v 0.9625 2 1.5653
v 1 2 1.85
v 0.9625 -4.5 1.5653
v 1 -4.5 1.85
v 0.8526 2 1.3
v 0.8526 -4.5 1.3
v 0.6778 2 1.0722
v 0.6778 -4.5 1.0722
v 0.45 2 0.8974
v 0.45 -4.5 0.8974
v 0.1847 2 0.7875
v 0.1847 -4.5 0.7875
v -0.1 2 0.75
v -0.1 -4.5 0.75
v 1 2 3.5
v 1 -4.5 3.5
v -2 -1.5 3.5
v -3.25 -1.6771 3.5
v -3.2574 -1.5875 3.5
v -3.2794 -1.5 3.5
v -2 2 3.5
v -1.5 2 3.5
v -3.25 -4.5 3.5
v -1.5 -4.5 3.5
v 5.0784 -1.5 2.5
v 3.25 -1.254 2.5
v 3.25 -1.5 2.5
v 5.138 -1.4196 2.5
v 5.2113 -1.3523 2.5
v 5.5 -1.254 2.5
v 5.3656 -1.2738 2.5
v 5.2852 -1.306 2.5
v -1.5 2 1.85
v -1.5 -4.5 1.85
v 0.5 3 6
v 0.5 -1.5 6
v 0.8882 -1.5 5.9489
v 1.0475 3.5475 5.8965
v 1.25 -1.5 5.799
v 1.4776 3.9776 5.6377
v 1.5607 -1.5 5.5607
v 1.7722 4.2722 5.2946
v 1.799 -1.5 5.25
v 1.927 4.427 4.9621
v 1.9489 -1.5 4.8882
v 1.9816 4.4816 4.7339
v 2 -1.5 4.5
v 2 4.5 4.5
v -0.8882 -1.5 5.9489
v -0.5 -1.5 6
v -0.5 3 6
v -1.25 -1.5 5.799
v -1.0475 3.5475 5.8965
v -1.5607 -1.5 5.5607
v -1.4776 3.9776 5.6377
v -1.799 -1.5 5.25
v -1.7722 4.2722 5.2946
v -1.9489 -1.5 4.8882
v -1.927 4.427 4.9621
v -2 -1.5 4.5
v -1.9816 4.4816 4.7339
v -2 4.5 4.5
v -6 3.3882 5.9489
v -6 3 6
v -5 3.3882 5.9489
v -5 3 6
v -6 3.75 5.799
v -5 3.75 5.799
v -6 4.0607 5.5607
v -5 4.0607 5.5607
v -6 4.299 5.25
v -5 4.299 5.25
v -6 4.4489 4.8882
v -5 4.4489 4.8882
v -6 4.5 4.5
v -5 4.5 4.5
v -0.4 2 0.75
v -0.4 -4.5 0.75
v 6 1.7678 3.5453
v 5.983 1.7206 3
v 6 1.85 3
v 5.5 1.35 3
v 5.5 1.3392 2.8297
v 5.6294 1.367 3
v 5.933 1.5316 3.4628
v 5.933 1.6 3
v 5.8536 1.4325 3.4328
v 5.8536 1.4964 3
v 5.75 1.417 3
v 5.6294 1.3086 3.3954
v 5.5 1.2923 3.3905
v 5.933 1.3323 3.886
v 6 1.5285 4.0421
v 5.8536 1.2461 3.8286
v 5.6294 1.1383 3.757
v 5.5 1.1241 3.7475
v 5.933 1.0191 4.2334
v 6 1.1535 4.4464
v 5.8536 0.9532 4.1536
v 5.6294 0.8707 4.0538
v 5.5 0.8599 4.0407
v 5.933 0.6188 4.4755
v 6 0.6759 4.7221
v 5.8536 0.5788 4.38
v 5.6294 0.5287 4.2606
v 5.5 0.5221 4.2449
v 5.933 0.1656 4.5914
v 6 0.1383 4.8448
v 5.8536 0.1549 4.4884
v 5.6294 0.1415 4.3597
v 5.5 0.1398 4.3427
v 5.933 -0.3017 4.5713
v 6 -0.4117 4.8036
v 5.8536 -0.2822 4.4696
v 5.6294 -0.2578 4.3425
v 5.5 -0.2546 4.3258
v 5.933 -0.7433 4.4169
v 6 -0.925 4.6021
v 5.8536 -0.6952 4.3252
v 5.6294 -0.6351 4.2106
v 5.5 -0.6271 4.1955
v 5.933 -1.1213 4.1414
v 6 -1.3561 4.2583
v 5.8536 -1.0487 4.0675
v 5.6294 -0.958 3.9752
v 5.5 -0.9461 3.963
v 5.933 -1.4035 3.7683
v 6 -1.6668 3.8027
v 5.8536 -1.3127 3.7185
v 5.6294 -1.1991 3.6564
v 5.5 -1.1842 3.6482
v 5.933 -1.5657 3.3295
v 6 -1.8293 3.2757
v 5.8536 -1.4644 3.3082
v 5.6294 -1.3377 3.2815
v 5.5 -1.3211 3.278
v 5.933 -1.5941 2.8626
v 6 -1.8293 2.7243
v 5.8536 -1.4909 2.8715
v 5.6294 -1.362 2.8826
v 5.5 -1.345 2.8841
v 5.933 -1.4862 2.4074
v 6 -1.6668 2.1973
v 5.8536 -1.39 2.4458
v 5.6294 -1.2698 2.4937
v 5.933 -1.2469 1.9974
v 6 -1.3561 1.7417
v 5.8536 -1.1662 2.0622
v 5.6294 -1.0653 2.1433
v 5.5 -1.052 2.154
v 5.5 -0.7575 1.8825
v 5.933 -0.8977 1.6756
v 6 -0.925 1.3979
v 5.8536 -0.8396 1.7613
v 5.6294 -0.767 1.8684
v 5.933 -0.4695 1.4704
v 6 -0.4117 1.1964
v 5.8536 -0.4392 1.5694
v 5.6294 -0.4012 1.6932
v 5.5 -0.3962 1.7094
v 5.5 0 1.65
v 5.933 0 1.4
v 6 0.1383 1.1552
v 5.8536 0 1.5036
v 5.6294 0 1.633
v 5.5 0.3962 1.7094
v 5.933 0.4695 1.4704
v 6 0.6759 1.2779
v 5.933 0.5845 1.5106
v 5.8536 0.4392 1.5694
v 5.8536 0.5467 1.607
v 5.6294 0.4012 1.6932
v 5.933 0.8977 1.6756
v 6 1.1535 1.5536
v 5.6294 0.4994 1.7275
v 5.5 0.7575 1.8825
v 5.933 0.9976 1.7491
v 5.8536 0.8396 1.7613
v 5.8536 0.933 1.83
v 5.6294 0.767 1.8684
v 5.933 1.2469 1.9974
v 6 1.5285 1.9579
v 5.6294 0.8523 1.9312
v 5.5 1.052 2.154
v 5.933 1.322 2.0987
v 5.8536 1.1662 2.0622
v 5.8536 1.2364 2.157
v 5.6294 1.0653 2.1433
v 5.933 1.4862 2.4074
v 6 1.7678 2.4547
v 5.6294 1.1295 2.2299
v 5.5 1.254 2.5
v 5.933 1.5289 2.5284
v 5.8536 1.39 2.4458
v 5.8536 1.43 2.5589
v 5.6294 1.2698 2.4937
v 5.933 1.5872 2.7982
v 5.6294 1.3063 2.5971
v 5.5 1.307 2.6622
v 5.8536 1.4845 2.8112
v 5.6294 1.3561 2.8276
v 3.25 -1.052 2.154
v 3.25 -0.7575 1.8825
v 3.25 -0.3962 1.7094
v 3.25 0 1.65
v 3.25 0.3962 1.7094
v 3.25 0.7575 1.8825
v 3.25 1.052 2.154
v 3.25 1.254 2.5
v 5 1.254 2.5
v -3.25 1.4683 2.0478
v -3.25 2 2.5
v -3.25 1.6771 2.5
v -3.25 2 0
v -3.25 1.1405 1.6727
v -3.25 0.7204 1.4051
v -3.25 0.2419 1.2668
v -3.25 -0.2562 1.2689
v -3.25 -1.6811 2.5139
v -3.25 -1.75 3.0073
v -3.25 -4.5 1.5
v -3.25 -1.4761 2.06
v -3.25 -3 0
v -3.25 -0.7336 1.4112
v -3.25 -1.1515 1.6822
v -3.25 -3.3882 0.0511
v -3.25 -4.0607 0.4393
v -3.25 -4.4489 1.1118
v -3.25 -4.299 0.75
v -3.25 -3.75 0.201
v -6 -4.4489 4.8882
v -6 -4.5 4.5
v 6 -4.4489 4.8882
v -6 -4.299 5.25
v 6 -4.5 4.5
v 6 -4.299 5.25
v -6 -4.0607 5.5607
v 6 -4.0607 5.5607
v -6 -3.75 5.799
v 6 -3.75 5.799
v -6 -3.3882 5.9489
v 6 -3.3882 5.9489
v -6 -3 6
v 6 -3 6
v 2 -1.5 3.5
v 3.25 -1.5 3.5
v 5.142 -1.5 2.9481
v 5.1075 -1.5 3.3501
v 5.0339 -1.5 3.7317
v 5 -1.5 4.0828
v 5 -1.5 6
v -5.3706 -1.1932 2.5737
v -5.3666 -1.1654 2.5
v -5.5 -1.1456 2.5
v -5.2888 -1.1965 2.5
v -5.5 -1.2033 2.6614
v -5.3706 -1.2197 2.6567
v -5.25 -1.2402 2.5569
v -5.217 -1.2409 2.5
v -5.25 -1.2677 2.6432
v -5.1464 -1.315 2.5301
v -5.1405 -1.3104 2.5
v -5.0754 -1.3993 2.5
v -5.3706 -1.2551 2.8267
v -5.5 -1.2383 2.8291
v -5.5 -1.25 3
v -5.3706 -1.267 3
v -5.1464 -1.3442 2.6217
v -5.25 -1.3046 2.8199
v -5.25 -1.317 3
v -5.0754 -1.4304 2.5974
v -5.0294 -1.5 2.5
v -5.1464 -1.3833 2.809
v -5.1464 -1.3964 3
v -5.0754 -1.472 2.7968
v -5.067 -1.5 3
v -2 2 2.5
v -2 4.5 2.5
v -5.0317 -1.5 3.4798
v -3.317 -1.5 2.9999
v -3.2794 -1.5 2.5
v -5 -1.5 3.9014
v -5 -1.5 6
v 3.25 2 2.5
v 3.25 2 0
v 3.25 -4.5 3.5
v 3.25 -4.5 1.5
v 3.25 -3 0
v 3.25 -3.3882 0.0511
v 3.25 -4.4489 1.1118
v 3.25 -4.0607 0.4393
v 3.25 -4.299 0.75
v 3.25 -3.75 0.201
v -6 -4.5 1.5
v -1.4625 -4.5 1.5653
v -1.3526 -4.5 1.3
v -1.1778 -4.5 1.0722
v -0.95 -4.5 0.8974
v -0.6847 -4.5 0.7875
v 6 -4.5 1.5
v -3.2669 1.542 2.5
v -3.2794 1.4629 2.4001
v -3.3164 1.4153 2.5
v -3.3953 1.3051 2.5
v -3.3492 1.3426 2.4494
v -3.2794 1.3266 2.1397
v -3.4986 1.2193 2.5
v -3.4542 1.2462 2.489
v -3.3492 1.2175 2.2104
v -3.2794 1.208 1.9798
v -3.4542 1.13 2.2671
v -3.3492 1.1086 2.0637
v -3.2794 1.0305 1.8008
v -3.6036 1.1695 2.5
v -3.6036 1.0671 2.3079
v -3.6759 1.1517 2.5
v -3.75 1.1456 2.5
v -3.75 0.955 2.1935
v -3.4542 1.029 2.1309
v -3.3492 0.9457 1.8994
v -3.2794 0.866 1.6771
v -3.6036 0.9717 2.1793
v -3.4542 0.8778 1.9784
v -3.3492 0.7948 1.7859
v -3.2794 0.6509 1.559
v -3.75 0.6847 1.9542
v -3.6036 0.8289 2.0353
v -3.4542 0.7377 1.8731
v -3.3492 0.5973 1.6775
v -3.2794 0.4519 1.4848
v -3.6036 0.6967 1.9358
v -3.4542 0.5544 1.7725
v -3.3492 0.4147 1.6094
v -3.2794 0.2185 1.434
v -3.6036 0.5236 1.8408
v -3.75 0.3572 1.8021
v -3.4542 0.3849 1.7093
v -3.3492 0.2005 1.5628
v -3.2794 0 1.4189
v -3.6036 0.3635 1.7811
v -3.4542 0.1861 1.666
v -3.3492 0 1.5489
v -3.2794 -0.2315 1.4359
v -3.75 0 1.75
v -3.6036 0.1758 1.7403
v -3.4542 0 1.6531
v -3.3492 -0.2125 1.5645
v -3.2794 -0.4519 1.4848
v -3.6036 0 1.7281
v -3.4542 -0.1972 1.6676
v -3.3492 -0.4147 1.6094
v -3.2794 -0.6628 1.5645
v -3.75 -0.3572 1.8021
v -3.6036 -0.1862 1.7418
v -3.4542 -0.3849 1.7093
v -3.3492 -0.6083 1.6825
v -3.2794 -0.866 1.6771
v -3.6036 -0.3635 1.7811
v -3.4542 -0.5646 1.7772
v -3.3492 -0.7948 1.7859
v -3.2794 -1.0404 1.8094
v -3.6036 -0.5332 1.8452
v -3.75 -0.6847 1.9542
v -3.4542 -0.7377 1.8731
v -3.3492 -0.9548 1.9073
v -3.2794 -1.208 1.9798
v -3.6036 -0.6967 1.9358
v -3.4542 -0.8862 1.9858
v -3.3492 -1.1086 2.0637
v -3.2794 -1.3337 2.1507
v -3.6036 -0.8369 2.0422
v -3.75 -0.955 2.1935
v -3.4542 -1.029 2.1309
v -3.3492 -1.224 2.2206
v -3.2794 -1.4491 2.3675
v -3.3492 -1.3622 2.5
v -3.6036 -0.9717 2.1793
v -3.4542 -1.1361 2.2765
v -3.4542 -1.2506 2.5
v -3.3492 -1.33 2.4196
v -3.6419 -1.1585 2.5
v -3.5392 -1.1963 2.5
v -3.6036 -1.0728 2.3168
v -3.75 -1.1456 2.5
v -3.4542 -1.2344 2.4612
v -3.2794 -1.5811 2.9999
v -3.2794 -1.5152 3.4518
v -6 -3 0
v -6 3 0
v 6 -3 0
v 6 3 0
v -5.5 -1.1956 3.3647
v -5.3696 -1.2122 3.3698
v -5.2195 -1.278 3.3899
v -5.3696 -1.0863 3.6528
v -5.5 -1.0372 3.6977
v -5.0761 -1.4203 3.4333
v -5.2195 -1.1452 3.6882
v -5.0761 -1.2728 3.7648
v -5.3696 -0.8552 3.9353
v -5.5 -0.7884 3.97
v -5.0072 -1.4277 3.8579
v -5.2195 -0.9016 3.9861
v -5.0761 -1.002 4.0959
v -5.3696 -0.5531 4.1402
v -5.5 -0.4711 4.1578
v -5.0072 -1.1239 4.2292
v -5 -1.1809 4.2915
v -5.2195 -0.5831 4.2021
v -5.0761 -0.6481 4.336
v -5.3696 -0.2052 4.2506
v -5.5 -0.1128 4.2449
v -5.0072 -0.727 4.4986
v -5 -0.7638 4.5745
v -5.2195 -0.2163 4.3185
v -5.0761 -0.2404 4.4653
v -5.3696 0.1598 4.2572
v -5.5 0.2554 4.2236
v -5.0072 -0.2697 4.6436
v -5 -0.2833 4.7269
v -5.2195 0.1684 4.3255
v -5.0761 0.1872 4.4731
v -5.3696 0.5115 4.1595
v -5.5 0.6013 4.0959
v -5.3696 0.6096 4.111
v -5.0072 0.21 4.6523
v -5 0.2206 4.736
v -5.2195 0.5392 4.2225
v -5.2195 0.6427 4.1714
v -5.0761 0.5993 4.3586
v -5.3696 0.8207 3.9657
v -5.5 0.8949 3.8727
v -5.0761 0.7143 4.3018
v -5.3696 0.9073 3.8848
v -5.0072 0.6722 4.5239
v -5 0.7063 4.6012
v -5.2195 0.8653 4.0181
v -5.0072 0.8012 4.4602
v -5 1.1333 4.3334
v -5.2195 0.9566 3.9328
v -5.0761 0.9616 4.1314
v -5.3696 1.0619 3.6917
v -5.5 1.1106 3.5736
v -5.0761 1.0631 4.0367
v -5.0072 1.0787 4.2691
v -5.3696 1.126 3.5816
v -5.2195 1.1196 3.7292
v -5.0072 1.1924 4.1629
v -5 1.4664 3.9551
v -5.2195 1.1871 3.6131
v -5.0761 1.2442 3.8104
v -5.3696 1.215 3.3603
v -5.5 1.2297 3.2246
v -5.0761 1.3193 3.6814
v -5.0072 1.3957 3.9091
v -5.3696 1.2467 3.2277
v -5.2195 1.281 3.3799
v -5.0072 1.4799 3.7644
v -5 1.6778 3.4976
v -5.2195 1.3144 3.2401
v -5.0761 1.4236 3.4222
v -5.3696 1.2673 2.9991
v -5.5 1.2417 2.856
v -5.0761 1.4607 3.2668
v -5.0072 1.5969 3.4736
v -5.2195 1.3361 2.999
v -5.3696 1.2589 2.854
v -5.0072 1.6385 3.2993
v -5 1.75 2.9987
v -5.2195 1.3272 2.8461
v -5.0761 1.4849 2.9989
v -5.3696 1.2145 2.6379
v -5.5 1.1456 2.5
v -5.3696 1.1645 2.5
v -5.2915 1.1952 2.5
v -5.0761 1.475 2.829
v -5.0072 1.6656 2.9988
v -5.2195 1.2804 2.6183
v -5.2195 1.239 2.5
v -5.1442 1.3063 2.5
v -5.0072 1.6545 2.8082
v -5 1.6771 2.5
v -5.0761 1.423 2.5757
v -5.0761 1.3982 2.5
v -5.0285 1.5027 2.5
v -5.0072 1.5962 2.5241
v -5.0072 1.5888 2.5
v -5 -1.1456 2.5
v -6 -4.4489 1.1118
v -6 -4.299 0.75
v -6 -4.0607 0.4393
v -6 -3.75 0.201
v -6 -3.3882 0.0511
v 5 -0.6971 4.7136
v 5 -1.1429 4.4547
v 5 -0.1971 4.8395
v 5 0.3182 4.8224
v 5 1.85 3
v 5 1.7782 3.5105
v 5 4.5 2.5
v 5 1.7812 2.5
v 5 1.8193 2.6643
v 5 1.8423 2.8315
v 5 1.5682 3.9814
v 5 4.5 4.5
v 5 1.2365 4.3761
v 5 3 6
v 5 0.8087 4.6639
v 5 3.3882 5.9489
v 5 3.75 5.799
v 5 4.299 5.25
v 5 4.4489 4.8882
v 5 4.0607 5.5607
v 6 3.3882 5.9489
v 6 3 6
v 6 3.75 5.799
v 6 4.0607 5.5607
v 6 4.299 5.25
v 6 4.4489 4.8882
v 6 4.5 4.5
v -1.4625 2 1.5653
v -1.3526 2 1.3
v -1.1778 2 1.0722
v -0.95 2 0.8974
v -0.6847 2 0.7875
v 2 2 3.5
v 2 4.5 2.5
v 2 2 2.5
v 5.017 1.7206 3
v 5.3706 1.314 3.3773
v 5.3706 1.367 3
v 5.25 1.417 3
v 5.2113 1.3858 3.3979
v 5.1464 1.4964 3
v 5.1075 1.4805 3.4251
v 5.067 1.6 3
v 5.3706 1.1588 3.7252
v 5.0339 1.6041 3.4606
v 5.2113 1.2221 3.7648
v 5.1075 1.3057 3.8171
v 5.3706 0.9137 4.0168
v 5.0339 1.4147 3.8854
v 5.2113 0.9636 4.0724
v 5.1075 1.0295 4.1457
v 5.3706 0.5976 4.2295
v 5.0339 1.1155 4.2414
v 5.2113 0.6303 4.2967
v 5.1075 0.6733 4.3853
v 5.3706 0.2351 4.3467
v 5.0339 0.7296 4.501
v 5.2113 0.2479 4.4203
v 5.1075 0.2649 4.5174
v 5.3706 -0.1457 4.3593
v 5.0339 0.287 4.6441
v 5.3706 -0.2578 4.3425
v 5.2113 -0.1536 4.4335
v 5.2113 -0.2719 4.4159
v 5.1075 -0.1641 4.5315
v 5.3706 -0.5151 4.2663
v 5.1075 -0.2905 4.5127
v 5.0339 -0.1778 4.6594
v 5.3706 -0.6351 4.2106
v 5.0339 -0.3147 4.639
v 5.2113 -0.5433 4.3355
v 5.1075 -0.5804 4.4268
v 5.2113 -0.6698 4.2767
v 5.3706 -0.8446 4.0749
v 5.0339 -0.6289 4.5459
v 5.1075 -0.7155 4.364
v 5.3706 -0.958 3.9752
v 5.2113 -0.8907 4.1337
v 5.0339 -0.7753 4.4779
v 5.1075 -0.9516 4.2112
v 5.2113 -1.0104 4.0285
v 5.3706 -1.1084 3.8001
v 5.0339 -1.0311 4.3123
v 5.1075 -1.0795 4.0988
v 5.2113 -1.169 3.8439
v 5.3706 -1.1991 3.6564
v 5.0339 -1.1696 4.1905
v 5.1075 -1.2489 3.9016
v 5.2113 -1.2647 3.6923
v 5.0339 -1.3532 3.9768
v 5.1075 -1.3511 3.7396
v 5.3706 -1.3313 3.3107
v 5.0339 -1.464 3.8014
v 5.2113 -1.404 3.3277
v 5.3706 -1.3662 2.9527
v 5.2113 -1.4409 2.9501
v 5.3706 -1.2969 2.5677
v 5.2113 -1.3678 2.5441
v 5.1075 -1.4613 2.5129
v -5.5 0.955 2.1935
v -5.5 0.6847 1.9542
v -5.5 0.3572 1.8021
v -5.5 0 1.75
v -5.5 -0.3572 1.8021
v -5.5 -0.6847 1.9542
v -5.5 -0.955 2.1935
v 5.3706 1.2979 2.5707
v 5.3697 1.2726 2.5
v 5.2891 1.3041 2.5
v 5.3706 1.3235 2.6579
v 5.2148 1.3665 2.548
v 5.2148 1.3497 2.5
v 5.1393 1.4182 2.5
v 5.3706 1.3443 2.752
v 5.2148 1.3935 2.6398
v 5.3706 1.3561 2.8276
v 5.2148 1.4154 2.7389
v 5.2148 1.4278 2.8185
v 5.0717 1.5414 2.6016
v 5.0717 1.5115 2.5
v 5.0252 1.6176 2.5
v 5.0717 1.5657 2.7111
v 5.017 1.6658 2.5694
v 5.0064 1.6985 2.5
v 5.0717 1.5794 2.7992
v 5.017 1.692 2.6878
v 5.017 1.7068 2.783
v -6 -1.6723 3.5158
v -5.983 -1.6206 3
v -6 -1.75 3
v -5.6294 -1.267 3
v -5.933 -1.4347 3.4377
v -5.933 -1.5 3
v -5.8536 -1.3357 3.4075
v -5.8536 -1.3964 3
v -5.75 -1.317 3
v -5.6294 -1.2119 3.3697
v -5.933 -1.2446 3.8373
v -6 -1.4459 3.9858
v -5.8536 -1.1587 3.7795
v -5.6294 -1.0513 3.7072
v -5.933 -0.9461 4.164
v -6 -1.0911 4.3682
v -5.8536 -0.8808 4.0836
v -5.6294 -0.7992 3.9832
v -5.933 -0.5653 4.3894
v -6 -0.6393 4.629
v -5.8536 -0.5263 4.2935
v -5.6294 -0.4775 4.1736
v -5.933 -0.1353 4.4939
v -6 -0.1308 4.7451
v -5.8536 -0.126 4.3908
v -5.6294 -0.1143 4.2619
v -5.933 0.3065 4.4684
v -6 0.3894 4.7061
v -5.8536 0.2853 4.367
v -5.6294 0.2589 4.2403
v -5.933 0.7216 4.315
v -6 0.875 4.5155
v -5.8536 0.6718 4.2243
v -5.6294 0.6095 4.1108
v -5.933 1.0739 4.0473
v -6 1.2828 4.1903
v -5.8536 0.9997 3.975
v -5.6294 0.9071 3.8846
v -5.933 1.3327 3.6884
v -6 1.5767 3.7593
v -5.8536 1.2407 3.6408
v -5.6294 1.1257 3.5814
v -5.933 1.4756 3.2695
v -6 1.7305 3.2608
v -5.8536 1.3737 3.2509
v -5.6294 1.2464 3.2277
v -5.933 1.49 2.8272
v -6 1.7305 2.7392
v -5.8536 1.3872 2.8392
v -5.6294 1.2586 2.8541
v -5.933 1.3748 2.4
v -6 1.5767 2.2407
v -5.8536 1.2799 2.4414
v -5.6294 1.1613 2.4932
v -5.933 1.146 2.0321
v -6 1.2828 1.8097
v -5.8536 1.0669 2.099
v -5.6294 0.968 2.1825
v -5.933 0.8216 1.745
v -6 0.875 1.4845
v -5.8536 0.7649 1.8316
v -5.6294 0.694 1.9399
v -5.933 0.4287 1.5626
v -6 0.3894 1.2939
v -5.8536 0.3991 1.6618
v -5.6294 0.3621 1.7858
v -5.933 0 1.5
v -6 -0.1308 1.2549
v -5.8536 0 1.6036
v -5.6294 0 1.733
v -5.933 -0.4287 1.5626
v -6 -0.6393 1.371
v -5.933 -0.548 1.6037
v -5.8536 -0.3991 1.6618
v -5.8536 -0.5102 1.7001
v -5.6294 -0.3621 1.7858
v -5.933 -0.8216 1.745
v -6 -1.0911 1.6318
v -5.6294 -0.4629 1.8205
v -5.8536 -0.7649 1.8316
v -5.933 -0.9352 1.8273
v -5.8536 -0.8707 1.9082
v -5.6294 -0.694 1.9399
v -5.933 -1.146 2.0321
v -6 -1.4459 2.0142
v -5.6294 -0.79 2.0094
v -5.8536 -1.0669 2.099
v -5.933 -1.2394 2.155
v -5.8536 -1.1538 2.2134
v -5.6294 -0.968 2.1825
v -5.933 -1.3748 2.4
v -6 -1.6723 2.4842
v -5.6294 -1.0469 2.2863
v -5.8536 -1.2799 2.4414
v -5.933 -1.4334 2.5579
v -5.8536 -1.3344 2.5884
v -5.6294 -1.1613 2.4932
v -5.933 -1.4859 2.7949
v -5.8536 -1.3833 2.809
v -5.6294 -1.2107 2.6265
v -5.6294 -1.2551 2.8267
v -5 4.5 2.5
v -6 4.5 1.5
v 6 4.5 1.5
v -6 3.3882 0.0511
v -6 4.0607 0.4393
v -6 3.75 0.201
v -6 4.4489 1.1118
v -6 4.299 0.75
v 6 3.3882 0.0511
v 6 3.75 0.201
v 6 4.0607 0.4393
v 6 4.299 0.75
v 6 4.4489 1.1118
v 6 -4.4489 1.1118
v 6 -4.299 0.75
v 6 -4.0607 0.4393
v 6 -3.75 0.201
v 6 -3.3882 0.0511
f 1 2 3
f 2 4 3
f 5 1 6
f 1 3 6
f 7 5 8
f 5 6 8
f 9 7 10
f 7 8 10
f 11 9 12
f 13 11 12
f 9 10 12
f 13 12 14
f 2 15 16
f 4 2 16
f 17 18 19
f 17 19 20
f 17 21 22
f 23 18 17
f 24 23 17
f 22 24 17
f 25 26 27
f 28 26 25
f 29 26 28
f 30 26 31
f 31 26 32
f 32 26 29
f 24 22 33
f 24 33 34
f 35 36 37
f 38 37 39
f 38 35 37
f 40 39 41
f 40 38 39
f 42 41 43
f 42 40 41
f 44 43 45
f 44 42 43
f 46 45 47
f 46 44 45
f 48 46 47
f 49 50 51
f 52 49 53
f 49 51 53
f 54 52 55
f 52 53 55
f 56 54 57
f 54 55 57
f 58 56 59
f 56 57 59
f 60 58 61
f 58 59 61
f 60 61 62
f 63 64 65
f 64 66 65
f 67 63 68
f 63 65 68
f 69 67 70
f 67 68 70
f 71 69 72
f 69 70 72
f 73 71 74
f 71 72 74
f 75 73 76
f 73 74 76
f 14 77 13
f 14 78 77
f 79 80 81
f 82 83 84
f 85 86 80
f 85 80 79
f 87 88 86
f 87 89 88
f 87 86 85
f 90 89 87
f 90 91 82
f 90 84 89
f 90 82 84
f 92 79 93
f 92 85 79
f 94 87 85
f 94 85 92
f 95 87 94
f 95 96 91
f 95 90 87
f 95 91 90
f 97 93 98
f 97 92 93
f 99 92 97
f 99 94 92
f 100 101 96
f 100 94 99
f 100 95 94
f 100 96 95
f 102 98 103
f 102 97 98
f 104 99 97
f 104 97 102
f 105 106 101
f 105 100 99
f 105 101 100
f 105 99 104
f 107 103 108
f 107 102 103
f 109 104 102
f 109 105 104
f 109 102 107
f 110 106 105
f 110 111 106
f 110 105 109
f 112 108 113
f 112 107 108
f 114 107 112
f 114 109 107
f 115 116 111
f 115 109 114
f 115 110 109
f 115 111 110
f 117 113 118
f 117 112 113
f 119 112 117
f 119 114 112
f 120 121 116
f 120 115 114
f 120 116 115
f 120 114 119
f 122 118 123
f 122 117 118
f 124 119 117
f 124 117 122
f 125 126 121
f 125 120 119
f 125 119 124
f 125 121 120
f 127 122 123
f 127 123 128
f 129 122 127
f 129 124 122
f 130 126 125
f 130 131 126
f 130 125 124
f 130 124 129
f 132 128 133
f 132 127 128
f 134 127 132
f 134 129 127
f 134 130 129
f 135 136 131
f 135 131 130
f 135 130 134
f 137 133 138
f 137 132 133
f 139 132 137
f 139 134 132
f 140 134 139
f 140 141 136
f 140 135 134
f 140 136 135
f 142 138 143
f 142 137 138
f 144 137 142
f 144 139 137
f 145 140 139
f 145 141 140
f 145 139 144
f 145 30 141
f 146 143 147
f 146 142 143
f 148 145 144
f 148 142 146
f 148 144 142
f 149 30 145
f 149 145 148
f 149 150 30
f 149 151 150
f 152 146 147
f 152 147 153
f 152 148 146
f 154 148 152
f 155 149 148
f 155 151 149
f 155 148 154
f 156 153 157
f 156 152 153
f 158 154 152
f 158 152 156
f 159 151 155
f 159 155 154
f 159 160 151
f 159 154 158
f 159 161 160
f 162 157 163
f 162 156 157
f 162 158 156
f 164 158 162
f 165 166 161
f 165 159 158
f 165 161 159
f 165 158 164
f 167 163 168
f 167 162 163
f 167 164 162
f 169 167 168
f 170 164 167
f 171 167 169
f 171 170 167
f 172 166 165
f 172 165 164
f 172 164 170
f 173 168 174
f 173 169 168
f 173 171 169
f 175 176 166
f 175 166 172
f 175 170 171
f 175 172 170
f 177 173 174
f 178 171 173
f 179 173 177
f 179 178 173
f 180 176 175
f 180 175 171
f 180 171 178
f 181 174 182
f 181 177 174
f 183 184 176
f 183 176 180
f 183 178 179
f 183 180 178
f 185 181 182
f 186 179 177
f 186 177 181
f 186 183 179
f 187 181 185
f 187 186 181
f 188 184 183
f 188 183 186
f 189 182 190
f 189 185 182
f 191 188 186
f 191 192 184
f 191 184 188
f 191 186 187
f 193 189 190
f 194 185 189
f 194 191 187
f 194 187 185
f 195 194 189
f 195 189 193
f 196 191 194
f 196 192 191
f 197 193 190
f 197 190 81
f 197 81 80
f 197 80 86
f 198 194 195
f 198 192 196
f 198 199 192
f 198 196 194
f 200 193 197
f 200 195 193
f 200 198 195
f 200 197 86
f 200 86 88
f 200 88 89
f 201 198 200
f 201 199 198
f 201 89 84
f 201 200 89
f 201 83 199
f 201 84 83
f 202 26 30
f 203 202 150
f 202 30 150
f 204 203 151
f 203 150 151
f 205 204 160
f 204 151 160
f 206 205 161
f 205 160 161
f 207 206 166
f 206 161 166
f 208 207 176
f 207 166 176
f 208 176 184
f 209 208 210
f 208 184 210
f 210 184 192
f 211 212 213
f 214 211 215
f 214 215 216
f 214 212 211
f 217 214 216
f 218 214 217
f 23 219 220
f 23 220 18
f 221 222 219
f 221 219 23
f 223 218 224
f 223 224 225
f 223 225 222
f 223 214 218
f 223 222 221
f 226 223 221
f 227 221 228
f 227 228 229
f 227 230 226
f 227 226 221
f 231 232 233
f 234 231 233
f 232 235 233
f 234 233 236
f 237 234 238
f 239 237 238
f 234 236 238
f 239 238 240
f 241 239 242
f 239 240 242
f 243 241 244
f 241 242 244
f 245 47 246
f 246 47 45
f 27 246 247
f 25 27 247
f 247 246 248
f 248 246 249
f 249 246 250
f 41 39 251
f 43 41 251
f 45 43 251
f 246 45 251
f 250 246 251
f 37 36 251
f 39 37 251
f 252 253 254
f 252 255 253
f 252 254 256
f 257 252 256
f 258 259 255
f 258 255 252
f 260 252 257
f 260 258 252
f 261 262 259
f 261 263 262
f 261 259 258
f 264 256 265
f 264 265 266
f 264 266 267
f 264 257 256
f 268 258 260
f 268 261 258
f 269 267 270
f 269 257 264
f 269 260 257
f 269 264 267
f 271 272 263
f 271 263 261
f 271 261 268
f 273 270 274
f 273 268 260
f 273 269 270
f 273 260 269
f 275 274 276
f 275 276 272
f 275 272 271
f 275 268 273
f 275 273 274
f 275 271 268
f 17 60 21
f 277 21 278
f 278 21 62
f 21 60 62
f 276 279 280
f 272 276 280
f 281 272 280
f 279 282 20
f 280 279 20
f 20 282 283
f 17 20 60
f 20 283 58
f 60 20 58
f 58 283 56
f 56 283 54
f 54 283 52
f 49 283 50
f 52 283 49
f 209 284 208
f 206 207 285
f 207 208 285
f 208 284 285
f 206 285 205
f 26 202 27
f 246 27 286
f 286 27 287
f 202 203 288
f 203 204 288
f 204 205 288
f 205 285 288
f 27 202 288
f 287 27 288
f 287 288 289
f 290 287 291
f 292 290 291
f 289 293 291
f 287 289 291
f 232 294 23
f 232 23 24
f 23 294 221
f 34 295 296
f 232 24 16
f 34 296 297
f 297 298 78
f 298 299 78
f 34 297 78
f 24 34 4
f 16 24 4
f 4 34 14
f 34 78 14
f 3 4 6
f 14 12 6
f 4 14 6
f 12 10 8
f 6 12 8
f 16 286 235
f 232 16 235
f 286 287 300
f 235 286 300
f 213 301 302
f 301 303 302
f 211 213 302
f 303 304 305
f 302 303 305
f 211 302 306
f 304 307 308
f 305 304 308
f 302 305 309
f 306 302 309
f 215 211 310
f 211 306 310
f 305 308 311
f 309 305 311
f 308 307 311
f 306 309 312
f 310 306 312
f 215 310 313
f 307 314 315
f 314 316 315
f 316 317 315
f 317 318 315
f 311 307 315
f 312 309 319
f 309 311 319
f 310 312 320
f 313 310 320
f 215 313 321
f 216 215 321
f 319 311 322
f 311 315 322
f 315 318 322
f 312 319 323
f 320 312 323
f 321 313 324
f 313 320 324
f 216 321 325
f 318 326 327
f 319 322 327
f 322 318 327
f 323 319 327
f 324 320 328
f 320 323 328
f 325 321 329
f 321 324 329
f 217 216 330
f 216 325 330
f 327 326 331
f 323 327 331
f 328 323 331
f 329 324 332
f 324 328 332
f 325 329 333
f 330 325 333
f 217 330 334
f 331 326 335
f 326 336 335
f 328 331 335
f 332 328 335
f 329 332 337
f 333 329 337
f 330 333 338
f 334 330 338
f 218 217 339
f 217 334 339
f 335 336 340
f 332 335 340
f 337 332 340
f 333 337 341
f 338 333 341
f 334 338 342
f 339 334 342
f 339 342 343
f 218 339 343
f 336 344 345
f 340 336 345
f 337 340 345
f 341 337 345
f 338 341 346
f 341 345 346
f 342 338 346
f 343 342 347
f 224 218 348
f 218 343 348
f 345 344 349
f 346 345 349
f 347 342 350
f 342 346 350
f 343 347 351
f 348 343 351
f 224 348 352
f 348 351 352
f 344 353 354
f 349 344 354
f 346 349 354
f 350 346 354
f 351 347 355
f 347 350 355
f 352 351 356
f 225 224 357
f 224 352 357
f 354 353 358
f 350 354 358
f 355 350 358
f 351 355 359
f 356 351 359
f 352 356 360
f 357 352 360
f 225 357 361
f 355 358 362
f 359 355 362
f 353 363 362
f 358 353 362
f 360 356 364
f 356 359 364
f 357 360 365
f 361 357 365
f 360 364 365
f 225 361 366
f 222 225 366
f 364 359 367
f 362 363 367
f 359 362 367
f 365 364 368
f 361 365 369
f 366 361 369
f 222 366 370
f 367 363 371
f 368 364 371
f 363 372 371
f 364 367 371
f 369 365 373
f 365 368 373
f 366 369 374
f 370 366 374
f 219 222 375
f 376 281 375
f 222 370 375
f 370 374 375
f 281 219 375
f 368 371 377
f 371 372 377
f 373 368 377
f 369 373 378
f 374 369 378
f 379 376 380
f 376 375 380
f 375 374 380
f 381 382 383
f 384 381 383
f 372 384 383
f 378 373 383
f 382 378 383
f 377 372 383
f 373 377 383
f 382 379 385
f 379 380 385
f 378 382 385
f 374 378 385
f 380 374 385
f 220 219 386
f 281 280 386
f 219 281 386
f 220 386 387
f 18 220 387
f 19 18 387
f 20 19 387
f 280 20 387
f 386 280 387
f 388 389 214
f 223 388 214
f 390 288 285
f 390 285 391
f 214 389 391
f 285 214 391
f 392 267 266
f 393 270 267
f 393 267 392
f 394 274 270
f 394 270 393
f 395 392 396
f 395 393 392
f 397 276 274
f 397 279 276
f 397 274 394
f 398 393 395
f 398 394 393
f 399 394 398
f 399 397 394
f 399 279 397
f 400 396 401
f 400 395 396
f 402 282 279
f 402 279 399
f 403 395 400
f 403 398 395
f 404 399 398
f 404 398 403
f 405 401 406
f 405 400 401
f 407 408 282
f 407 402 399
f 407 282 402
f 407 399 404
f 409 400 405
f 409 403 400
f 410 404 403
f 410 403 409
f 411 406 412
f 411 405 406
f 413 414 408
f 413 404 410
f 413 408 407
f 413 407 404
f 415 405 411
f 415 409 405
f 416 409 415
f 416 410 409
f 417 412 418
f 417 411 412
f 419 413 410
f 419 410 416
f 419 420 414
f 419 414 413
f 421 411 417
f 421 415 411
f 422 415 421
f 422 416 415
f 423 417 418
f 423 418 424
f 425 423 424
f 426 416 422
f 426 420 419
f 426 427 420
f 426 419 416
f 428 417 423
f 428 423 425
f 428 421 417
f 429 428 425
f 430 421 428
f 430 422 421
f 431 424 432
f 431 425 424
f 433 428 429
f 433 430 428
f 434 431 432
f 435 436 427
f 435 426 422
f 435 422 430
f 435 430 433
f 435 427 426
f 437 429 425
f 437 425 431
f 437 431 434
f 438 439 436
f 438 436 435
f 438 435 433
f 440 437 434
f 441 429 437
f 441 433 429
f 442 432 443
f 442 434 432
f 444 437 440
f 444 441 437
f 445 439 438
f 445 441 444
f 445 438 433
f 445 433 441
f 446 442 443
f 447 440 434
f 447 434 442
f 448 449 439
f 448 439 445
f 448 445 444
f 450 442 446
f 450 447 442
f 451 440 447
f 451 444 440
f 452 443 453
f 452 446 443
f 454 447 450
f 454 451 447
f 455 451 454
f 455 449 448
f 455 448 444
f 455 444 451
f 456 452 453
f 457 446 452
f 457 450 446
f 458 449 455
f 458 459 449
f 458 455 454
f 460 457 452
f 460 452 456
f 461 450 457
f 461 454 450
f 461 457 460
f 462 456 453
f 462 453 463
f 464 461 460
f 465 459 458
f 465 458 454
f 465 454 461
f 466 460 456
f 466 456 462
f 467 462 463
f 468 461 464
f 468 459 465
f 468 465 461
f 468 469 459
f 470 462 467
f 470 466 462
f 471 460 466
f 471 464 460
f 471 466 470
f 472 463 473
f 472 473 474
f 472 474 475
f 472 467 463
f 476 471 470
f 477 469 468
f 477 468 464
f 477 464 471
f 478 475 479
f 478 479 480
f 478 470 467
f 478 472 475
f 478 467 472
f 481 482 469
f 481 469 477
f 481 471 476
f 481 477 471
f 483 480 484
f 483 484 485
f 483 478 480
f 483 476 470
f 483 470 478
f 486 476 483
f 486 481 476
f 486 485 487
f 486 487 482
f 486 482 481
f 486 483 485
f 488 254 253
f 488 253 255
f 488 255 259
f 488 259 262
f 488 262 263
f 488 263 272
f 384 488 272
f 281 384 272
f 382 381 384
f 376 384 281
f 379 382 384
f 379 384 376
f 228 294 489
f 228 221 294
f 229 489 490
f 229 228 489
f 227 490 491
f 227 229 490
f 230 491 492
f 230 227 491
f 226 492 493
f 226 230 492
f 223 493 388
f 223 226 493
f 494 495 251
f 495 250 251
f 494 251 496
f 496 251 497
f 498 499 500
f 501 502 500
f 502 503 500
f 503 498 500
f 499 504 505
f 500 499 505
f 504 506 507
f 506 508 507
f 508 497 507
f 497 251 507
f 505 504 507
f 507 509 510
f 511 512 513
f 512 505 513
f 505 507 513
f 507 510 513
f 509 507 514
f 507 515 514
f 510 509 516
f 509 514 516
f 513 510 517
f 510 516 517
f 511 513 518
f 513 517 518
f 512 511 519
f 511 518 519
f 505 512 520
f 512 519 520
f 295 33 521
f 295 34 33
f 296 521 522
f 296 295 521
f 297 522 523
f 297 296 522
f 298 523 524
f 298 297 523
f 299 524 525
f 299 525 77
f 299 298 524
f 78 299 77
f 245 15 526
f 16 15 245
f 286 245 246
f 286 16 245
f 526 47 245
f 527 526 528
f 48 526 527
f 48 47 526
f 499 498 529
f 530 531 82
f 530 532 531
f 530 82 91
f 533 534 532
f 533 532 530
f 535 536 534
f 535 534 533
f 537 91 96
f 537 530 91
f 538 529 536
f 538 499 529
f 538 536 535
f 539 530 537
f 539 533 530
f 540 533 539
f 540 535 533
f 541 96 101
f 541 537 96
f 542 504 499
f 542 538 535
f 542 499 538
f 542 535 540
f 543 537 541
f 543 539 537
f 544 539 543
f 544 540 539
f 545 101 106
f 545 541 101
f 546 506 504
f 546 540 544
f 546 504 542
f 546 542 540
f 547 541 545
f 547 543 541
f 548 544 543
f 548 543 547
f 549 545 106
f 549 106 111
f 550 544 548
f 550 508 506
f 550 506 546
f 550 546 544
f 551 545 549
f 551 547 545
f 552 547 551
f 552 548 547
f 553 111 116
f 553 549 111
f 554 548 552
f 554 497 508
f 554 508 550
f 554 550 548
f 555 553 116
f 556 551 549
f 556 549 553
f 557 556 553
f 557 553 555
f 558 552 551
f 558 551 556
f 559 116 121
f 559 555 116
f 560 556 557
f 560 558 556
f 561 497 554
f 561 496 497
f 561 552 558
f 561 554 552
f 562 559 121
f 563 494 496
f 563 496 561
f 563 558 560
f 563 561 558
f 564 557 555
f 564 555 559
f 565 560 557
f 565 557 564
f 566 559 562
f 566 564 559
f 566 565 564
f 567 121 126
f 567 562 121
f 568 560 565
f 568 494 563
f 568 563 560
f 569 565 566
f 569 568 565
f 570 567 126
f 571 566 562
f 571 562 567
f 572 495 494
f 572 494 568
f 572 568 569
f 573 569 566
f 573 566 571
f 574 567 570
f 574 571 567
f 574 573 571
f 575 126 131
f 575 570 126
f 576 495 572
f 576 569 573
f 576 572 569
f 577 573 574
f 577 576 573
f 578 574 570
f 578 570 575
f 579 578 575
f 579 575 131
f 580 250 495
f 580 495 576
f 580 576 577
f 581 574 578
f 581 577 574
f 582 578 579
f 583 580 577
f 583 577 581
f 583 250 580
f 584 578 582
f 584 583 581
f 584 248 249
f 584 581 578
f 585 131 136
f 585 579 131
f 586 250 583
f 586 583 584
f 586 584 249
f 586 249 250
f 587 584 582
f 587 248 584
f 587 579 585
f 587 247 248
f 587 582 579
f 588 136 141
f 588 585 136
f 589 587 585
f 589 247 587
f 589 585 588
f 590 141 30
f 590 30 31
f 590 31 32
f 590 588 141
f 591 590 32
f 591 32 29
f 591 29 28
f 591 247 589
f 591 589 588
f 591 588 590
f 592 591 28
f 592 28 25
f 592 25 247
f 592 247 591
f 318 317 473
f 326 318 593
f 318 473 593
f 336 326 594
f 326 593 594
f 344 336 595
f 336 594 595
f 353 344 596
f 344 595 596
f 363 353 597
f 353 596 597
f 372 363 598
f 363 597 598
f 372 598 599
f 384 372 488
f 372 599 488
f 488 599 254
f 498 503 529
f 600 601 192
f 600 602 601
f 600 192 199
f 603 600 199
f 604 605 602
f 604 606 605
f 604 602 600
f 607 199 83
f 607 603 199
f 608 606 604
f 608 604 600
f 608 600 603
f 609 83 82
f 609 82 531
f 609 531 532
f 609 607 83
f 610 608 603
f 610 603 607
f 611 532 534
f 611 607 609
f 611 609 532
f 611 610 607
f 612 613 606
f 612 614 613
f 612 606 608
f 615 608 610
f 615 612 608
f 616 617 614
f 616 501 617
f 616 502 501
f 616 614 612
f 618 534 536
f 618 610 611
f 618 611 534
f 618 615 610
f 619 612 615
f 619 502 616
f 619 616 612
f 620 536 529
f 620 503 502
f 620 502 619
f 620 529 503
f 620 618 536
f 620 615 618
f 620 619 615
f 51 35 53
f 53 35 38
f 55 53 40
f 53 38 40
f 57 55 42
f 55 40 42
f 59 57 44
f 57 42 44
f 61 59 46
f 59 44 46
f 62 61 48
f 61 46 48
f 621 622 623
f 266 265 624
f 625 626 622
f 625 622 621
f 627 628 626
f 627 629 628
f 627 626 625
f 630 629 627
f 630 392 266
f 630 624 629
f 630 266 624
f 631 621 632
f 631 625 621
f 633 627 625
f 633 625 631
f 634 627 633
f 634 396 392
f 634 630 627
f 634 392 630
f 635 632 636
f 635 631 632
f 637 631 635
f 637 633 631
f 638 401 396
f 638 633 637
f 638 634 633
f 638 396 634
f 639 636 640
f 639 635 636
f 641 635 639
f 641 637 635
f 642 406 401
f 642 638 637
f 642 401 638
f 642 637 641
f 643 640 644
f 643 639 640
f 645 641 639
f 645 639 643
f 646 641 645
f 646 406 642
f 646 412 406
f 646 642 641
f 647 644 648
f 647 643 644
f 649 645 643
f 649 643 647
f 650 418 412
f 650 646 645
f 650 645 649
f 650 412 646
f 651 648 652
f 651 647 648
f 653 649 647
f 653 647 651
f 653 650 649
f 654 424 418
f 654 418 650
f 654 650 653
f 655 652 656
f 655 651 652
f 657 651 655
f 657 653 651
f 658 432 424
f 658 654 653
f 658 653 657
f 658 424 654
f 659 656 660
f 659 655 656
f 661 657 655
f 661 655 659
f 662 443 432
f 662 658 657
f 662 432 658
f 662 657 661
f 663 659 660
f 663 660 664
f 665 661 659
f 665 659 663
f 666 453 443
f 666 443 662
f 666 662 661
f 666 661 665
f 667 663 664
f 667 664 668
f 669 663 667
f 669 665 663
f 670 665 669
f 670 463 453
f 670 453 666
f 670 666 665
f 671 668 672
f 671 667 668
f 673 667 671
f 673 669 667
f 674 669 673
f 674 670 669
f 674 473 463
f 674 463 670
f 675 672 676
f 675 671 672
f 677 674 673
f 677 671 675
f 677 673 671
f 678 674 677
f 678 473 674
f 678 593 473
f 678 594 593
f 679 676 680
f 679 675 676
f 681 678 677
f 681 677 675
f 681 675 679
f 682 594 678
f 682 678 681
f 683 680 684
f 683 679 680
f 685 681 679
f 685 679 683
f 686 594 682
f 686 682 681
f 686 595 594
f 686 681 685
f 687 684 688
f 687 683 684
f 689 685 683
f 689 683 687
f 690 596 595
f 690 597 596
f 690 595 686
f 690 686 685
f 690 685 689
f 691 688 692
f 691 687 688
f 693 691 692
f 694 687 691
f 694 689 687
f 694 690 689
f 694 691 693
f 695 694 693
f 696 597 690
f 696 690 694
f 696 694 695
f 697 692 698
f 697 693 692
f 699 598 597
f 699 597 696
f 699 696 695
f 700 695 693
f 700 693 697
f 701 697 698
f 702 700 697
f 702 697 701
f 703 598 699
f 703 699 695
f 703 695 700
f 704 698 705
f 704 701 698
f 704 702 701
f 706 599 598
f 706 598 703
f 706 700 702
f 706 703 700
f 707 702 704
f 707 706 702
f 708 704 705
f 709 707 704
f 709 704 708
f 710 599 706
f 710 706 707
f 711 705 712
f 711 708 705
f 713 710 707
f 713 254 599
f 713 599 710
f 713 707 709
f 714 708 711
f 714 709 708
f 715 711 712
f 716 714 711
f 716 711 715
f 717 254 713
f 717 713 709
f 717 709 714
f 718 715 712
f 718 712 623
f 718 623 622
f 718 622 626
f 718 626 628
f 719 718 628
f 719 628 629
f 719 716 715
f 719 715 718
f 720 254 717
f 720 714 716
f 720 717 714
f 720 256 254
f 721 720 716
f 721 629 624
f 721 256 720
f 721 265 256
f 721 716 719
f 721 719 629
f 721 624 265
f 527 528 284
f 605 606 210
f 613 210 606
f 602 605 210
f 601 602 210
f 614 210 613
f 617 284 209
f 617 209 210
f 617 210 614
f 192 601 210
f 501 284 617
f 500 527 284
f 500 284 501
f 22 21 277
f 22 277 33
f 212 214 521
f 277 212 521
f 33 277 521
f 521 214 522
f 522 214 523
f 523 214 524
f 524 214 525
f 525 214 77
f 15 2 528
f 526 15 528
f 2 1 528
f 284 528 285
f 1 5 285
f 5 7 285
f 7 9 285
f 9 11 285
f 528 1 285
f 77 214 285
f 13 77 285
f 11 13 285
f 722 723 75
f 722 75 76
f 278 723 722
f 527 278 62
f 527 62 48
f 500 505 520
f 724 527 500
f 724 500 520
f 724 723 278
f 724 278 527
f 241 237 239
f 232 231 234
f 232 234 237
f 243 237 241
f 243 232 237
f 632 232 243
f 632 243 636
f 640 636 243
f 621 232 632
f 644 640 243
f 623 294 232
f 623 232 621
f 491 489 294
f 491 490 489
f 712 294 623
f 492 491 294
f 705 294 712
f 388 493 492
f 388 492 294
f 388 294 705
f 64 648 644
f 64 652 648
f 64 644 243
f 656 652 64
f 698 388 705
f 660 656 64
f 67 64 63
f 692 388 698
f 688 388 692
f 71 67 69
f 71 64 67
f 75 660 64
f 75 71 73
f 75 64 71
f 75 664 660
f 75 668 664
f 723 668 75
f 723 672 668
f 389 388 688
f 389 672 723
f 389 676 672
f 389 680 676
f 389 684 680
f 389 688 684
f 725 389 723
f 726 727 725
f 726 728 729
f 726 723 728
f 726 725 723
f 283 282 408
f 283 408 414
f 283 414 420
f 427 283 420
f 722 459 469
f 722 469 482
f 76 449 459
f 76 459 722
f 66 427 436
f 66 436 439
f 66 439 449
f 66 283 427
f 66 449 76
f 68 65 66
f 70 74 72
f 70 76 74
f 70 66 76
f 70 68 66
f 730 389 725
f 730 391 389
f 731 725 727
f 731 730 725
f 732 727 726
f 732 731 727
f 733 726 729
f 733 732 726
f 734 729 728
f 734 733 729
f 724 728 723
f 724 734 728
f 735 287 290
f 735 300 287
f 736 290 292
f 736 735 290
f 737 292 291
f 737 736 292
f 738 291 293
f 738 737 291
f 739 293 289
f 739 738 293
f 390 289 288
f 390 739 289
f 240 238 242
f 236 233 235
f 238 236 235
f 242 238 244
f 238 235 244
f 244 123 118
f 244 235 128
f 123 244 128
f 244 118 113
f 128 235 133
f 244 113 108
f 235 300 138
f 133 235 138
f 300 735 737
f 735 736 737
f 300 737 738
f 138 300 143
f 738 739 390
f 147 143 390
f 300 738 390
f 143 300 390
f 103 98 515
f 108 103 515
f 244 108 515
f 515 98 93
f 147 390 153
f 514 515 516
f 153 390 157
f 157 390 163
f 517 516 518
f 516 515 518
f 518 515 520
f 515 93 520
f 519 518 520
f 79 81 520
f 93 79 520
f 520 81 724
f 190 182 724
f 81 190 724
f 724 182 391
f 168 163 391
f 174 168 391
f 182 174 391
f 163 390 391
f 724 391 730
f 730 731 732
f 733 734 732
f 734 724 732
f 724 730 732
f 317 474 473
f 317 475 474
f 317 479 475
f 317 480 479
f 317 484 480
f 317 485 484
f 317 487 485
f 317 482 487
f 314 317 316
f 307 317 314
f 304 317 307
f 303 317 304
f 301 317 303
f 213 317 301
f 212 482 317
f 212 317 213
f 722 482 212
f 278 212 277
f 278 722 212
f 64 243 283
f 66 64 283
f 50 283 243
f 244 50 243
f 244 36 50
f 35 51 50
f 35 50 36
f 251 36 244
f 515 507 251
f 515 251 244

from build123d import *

# Parameters (mm, degrees)
F0_W          = 12
F0_H          = 9
F1_DEPTH      = 6
F2_W          = 3
F2_H          = 6
F3_DEPTH      = 3.5
F4_W          = 6.5
F4_H          = 6.5
F5_DEPTH      = 3.5
F6_R          = 1.35
F7_DEPTH      = 3
F8_R          = 1.25
F9_DEPTH      = 2.751
F10_R         = 1.5
F11_W         = 2.5
F11_H         = 6.5
F12_DEPTH     = 2.75
F13_R         = 1.1
F14_T8_ANGLE  = 247.5355258221
F14_T13_ANGLE = 74.7913514773
F14_T18_ANGLE = 254.8973081934
F14_T24_ANGLE = 80.8755372564
F14_T30_ANGLE = 260.9918579461


# Not quite as in the source:
# - a fillet or chamfer that OpenCascade refuses, or shapes differently, is made with other operations: its cross-section is extruded or revolved along the edge and cut away or added


with BuildPart() as f1:
    # F0 (on Top) → F1 (new body)
    with BuildSketch(Plane.XY):
        Rectangle(F0_W, F0_H)
    extrude(amount=F1_DEPTH)

    # F2 (on face) → F3 (cut)
    with BuildSketch(Plane.XY.offset(6)):
        with Locations((3.5, 1.5)):
            Rectangle(F2_W, F2_H)
        with Locations((-3.5, 1.5)):
            Rectangle(F2_W, F2_H)
    extrude(amount=-F3_DEPTH, mode=Mode.SUBTRACT)

    # F4 (on face) → F5 (cut)
    with BuildSketch(Plane(origin=(0, 0, 0), x_dir=(1, 0, 0), z_dir=(0, 0, -1))):
        with Locations((0, 1.25)):
            Rectangle(F4_W, F4_H)
    extrude(amount=-F5_DEPTH, mode=Mode.SUBTRACT)

    # F6 (on face) → F7 (cut)
    with BuildSketch(Plane.YZ.offset(6)):
        with Locations((0, 3)):
            Circle(F6_R)
    extrude(amount=-F7_DEPTH, mode=Mode.SUBTRACT)

    # F8 (on face) → F9 (cut, through all)
    with BuildSketch(Plane(origin=(-6, 0, 0), x_dir=(0, -1, 0), z_dir=(-1, 0, 0))):
        with Locations((0, 3)):
            Circle(F8_R)
    extrude(amount=-F9_DEPTH, mode=Mode.SUBTRACT)

    # F10
    f10_edges = [f1.edges().sort_by_distance(p)[0] for p in [
        (2, 1.5, 6),
        (-2, 1.5, 6),
        (0, -4.5, 6),
        (-4.625, -4.5, 0),
        (4.625, -4.5, 0),
        (0, 4.5, 0),
        (-5.5, 4.5, 6),
        (5.5, 4.5, 6),
        (0, 4.5, 6),
    ]]
    fillet(f10_edges, radius=F10_R)

    # F11 (on face) → F12 (join)
    with BuildSketch(Plane(origin=(0, 0, 3.5), x_dir=(1, 0, 0), z_dir=(0, 0, -1))):
        with Locations((-0.25, 1.25)):
            Rectangle(F11_W, F11_H)
    extrude(amount=F12_DEPTH)

    # F13
    f13_edges = [f1.edges().sort_by_distance(p)[0] for p in [
        (-1.5, -1.25, 0.75),
        (1, -1.25, 0.75),
    ]]
    fillet(f13_edges, radius=F13_R)

    # F14: fillet of radius 0.5 on 7 edges, made by hand

    # F14_s1 → F14_t2 (revolve, cut)
    with BuildSketch(Plane.XY.offset(3)):
        with BuildLine():
            ThreePointArc((6, 1.85), (5.8535533906, 1.4964466094), (5.5, 1.35))
            Line((5.5, 1.35), (6, 1.35))
            Line((6, 1.35), (6, 1.85))
        make_face()
    revolve(axis=Axis((6, 0, 3), (1, 0, 0)), mode=Mode.SUBTRACT)

    # F14_s3 → F14_t4 (revolve, cut)
    with BuildSketch(Plane.XY.offset(3)):
        with BuildLine():
            ThreePointArc((-6, -1.75), (-5.8535533906, -1.3964466094), (-5.5, -1.25))
            Line((-5.5, -1.25), (-6, -1.25))
            Line((-6, -1.25), (-6, -1.75))
        make_face()
    revolve(axis=Axis((-6, 0, 3), (-1, 0, 0)), mode=Mode.SUBTRACT)


with BuildPart() as f14_tool6:
    # F14_s7 → F14_t8 (revolve)
    with BuildSketch(Plane(origin=(0, -1.3861749524, 2.0731657713), x_dir=(1, 0, 0), z_dir=(0, -0.5558279796, 0.8312973338))):
        with BuildLine():
            ThreePointArc((-3.25, 3.4174839388), (-3.3964466094, 3.0639305482), (-3.75, 2.9174839388))
            Line((-3.75, 2.9174839388), (-3.25, 2.9174839388))
            Line((-3.25, 2.9174839388), (-3.25, 3.4174839388))
        make_face()
    revolve(axis=Axis((-3.25, 0, 3), (-1, 0, 0)), revolution_arc=F14_T8_ANGLE)

    split(bisect_by=Plane.XY.offset(3.5), keep=Keep.BOTTOM)


with BuildPart() as f1_1:
    add(f1.part)

    # F14_t5: cut F14_tool6
    add(f14_tool6.part, mode=Mode.SUBTRACT)


with BuildPart() as f14_tool11:
    # F14_s12 → F14_t13 (revolve)
    with BuildSketch(Plane(origin=(0, 0.7594411885, 0.2064587052), x_dir=(1, 0, 0), z_dir=(0, -0.9649769073, -0.2623348403))):
        with BuildLine():
            ThreePointArc((5.5, 1.5449307218), (5.1464466094, 1.3984841124), (5, 1.0449307218))
            Line((5, 1.0449307218), (5, 1.5449307218))
            Line((5, 1.5449307218), (5.5, 1.5449307218))
        make_face()
    revolve(axis=Axis((5, 0, 3), (1, 0, 0)), revolution_arc=F14_T13_ANGLE)

    split(bisect_by=Plane.XY.offset(2.5), keep=Keep.TOP)


with BuildPart() as f1_2:
    add(f1_1.part)

    # F14_t10: cut F14_tool11
    add(f14_tool11.part, mode=Mode.SUBTRACT)


with BuildPart() as f14_tool16:
    # F14_s17 → F14_t18 (revolve)
    with BuildSketch(Plane.XY.offset(3)):
        with BuildLine():
            ThreePointArc((5.5, 1.35), (5.1464466094, 1.4964466094), (5, 1.85))
            Line((5, 1.85), (5, 1.35))
            Line((5, 1.35), (5.5, 1.35))
        make_face()
    revolve(axis=Axis((5, 0, 3), (1, 0, 0)), revolution_arc=F14_T18_ANGLE)

    split(bisect_by=Plane.XZ.offset(1.5), keep=Keep.BOTTOM)

    split(bisect_by=Plane.XY.offset(2.5), keep=Keep.TOP)


with BuildPart() as f1_3:
    add(f1_2.part)

    # F14_t15: cut F14_tool16
    add(f14_tool16.part, mode=Mode.SUBTRACT)


with BuildPart() as f14_tool22:
    # F14_s23 → F14_t24 (revolve)
    with BuildSketch(Plane(origin=(0, -0.469718994, 0.0754425014), x_dir=(1, 0, 0), z_dir=(0, 0.9873461903, -0.1585796345))):
        with BuildLine():
            ThreePointArc((-5.5, -1.7120385709), (-5.1464466094, -1.5655919615), (-5, -1.2120385709))
            Line((-5, -1.2120385709), (-5, -1.7120385709))
            Line((-5, -1.7120385709), (-5.5, -1.7120385709))
        make_face()
    revolve(axis=Axis((-5, 0, 3), (-1, 0, 0)), revolution_arc=F14_T24_ANGLE)

    split(bisect_by=Plane.XZ.offset(1.5), keep=Keep.BOTTOM)

    split(bisect_by=Plane.XY.offset(2.5), keep=Keep.TOP)


with BuildPart() as f1_4:
    add(f1_3.part)

    # F14_t21: cut F14_tool22
    add(f14_tool22.part, mode=Mode.SUBTRACT)


with BuildPart() as f14_tool28:
    # F14_s29 → F14_t30 (revolve)
    with BuildSketch(Plane.XY.offset(3)):
        with BuildLine():
            ThreePointArc((-5.5, -1.25), (-5.1464466094, -1.3964466094), (-5, -1.75))
            Line((-5, -1.75), (-5, -1.25))
            Line((-5, -1.25), (-5.5, -1.25))
        make_face()
    revolve(axis=Axis((-5, 0, 3), (-1, 0, 0)), revolution_arc=F14_T30_ANGLE)

    split(bisect_by=Plane.XZ.offset(1.5), keep=Keep.BOTTOM)

    split(bisect_by=Plane.XY.offset(2.5), keep=Keep.TOP)


with BuildPart() as f1_5:
    add(f1_4.part)

    # F14_t27: cut F14_tool28
    add(f14_tool28.part, mode=Mode.SUBTRACT)


solid = f1_5.part
